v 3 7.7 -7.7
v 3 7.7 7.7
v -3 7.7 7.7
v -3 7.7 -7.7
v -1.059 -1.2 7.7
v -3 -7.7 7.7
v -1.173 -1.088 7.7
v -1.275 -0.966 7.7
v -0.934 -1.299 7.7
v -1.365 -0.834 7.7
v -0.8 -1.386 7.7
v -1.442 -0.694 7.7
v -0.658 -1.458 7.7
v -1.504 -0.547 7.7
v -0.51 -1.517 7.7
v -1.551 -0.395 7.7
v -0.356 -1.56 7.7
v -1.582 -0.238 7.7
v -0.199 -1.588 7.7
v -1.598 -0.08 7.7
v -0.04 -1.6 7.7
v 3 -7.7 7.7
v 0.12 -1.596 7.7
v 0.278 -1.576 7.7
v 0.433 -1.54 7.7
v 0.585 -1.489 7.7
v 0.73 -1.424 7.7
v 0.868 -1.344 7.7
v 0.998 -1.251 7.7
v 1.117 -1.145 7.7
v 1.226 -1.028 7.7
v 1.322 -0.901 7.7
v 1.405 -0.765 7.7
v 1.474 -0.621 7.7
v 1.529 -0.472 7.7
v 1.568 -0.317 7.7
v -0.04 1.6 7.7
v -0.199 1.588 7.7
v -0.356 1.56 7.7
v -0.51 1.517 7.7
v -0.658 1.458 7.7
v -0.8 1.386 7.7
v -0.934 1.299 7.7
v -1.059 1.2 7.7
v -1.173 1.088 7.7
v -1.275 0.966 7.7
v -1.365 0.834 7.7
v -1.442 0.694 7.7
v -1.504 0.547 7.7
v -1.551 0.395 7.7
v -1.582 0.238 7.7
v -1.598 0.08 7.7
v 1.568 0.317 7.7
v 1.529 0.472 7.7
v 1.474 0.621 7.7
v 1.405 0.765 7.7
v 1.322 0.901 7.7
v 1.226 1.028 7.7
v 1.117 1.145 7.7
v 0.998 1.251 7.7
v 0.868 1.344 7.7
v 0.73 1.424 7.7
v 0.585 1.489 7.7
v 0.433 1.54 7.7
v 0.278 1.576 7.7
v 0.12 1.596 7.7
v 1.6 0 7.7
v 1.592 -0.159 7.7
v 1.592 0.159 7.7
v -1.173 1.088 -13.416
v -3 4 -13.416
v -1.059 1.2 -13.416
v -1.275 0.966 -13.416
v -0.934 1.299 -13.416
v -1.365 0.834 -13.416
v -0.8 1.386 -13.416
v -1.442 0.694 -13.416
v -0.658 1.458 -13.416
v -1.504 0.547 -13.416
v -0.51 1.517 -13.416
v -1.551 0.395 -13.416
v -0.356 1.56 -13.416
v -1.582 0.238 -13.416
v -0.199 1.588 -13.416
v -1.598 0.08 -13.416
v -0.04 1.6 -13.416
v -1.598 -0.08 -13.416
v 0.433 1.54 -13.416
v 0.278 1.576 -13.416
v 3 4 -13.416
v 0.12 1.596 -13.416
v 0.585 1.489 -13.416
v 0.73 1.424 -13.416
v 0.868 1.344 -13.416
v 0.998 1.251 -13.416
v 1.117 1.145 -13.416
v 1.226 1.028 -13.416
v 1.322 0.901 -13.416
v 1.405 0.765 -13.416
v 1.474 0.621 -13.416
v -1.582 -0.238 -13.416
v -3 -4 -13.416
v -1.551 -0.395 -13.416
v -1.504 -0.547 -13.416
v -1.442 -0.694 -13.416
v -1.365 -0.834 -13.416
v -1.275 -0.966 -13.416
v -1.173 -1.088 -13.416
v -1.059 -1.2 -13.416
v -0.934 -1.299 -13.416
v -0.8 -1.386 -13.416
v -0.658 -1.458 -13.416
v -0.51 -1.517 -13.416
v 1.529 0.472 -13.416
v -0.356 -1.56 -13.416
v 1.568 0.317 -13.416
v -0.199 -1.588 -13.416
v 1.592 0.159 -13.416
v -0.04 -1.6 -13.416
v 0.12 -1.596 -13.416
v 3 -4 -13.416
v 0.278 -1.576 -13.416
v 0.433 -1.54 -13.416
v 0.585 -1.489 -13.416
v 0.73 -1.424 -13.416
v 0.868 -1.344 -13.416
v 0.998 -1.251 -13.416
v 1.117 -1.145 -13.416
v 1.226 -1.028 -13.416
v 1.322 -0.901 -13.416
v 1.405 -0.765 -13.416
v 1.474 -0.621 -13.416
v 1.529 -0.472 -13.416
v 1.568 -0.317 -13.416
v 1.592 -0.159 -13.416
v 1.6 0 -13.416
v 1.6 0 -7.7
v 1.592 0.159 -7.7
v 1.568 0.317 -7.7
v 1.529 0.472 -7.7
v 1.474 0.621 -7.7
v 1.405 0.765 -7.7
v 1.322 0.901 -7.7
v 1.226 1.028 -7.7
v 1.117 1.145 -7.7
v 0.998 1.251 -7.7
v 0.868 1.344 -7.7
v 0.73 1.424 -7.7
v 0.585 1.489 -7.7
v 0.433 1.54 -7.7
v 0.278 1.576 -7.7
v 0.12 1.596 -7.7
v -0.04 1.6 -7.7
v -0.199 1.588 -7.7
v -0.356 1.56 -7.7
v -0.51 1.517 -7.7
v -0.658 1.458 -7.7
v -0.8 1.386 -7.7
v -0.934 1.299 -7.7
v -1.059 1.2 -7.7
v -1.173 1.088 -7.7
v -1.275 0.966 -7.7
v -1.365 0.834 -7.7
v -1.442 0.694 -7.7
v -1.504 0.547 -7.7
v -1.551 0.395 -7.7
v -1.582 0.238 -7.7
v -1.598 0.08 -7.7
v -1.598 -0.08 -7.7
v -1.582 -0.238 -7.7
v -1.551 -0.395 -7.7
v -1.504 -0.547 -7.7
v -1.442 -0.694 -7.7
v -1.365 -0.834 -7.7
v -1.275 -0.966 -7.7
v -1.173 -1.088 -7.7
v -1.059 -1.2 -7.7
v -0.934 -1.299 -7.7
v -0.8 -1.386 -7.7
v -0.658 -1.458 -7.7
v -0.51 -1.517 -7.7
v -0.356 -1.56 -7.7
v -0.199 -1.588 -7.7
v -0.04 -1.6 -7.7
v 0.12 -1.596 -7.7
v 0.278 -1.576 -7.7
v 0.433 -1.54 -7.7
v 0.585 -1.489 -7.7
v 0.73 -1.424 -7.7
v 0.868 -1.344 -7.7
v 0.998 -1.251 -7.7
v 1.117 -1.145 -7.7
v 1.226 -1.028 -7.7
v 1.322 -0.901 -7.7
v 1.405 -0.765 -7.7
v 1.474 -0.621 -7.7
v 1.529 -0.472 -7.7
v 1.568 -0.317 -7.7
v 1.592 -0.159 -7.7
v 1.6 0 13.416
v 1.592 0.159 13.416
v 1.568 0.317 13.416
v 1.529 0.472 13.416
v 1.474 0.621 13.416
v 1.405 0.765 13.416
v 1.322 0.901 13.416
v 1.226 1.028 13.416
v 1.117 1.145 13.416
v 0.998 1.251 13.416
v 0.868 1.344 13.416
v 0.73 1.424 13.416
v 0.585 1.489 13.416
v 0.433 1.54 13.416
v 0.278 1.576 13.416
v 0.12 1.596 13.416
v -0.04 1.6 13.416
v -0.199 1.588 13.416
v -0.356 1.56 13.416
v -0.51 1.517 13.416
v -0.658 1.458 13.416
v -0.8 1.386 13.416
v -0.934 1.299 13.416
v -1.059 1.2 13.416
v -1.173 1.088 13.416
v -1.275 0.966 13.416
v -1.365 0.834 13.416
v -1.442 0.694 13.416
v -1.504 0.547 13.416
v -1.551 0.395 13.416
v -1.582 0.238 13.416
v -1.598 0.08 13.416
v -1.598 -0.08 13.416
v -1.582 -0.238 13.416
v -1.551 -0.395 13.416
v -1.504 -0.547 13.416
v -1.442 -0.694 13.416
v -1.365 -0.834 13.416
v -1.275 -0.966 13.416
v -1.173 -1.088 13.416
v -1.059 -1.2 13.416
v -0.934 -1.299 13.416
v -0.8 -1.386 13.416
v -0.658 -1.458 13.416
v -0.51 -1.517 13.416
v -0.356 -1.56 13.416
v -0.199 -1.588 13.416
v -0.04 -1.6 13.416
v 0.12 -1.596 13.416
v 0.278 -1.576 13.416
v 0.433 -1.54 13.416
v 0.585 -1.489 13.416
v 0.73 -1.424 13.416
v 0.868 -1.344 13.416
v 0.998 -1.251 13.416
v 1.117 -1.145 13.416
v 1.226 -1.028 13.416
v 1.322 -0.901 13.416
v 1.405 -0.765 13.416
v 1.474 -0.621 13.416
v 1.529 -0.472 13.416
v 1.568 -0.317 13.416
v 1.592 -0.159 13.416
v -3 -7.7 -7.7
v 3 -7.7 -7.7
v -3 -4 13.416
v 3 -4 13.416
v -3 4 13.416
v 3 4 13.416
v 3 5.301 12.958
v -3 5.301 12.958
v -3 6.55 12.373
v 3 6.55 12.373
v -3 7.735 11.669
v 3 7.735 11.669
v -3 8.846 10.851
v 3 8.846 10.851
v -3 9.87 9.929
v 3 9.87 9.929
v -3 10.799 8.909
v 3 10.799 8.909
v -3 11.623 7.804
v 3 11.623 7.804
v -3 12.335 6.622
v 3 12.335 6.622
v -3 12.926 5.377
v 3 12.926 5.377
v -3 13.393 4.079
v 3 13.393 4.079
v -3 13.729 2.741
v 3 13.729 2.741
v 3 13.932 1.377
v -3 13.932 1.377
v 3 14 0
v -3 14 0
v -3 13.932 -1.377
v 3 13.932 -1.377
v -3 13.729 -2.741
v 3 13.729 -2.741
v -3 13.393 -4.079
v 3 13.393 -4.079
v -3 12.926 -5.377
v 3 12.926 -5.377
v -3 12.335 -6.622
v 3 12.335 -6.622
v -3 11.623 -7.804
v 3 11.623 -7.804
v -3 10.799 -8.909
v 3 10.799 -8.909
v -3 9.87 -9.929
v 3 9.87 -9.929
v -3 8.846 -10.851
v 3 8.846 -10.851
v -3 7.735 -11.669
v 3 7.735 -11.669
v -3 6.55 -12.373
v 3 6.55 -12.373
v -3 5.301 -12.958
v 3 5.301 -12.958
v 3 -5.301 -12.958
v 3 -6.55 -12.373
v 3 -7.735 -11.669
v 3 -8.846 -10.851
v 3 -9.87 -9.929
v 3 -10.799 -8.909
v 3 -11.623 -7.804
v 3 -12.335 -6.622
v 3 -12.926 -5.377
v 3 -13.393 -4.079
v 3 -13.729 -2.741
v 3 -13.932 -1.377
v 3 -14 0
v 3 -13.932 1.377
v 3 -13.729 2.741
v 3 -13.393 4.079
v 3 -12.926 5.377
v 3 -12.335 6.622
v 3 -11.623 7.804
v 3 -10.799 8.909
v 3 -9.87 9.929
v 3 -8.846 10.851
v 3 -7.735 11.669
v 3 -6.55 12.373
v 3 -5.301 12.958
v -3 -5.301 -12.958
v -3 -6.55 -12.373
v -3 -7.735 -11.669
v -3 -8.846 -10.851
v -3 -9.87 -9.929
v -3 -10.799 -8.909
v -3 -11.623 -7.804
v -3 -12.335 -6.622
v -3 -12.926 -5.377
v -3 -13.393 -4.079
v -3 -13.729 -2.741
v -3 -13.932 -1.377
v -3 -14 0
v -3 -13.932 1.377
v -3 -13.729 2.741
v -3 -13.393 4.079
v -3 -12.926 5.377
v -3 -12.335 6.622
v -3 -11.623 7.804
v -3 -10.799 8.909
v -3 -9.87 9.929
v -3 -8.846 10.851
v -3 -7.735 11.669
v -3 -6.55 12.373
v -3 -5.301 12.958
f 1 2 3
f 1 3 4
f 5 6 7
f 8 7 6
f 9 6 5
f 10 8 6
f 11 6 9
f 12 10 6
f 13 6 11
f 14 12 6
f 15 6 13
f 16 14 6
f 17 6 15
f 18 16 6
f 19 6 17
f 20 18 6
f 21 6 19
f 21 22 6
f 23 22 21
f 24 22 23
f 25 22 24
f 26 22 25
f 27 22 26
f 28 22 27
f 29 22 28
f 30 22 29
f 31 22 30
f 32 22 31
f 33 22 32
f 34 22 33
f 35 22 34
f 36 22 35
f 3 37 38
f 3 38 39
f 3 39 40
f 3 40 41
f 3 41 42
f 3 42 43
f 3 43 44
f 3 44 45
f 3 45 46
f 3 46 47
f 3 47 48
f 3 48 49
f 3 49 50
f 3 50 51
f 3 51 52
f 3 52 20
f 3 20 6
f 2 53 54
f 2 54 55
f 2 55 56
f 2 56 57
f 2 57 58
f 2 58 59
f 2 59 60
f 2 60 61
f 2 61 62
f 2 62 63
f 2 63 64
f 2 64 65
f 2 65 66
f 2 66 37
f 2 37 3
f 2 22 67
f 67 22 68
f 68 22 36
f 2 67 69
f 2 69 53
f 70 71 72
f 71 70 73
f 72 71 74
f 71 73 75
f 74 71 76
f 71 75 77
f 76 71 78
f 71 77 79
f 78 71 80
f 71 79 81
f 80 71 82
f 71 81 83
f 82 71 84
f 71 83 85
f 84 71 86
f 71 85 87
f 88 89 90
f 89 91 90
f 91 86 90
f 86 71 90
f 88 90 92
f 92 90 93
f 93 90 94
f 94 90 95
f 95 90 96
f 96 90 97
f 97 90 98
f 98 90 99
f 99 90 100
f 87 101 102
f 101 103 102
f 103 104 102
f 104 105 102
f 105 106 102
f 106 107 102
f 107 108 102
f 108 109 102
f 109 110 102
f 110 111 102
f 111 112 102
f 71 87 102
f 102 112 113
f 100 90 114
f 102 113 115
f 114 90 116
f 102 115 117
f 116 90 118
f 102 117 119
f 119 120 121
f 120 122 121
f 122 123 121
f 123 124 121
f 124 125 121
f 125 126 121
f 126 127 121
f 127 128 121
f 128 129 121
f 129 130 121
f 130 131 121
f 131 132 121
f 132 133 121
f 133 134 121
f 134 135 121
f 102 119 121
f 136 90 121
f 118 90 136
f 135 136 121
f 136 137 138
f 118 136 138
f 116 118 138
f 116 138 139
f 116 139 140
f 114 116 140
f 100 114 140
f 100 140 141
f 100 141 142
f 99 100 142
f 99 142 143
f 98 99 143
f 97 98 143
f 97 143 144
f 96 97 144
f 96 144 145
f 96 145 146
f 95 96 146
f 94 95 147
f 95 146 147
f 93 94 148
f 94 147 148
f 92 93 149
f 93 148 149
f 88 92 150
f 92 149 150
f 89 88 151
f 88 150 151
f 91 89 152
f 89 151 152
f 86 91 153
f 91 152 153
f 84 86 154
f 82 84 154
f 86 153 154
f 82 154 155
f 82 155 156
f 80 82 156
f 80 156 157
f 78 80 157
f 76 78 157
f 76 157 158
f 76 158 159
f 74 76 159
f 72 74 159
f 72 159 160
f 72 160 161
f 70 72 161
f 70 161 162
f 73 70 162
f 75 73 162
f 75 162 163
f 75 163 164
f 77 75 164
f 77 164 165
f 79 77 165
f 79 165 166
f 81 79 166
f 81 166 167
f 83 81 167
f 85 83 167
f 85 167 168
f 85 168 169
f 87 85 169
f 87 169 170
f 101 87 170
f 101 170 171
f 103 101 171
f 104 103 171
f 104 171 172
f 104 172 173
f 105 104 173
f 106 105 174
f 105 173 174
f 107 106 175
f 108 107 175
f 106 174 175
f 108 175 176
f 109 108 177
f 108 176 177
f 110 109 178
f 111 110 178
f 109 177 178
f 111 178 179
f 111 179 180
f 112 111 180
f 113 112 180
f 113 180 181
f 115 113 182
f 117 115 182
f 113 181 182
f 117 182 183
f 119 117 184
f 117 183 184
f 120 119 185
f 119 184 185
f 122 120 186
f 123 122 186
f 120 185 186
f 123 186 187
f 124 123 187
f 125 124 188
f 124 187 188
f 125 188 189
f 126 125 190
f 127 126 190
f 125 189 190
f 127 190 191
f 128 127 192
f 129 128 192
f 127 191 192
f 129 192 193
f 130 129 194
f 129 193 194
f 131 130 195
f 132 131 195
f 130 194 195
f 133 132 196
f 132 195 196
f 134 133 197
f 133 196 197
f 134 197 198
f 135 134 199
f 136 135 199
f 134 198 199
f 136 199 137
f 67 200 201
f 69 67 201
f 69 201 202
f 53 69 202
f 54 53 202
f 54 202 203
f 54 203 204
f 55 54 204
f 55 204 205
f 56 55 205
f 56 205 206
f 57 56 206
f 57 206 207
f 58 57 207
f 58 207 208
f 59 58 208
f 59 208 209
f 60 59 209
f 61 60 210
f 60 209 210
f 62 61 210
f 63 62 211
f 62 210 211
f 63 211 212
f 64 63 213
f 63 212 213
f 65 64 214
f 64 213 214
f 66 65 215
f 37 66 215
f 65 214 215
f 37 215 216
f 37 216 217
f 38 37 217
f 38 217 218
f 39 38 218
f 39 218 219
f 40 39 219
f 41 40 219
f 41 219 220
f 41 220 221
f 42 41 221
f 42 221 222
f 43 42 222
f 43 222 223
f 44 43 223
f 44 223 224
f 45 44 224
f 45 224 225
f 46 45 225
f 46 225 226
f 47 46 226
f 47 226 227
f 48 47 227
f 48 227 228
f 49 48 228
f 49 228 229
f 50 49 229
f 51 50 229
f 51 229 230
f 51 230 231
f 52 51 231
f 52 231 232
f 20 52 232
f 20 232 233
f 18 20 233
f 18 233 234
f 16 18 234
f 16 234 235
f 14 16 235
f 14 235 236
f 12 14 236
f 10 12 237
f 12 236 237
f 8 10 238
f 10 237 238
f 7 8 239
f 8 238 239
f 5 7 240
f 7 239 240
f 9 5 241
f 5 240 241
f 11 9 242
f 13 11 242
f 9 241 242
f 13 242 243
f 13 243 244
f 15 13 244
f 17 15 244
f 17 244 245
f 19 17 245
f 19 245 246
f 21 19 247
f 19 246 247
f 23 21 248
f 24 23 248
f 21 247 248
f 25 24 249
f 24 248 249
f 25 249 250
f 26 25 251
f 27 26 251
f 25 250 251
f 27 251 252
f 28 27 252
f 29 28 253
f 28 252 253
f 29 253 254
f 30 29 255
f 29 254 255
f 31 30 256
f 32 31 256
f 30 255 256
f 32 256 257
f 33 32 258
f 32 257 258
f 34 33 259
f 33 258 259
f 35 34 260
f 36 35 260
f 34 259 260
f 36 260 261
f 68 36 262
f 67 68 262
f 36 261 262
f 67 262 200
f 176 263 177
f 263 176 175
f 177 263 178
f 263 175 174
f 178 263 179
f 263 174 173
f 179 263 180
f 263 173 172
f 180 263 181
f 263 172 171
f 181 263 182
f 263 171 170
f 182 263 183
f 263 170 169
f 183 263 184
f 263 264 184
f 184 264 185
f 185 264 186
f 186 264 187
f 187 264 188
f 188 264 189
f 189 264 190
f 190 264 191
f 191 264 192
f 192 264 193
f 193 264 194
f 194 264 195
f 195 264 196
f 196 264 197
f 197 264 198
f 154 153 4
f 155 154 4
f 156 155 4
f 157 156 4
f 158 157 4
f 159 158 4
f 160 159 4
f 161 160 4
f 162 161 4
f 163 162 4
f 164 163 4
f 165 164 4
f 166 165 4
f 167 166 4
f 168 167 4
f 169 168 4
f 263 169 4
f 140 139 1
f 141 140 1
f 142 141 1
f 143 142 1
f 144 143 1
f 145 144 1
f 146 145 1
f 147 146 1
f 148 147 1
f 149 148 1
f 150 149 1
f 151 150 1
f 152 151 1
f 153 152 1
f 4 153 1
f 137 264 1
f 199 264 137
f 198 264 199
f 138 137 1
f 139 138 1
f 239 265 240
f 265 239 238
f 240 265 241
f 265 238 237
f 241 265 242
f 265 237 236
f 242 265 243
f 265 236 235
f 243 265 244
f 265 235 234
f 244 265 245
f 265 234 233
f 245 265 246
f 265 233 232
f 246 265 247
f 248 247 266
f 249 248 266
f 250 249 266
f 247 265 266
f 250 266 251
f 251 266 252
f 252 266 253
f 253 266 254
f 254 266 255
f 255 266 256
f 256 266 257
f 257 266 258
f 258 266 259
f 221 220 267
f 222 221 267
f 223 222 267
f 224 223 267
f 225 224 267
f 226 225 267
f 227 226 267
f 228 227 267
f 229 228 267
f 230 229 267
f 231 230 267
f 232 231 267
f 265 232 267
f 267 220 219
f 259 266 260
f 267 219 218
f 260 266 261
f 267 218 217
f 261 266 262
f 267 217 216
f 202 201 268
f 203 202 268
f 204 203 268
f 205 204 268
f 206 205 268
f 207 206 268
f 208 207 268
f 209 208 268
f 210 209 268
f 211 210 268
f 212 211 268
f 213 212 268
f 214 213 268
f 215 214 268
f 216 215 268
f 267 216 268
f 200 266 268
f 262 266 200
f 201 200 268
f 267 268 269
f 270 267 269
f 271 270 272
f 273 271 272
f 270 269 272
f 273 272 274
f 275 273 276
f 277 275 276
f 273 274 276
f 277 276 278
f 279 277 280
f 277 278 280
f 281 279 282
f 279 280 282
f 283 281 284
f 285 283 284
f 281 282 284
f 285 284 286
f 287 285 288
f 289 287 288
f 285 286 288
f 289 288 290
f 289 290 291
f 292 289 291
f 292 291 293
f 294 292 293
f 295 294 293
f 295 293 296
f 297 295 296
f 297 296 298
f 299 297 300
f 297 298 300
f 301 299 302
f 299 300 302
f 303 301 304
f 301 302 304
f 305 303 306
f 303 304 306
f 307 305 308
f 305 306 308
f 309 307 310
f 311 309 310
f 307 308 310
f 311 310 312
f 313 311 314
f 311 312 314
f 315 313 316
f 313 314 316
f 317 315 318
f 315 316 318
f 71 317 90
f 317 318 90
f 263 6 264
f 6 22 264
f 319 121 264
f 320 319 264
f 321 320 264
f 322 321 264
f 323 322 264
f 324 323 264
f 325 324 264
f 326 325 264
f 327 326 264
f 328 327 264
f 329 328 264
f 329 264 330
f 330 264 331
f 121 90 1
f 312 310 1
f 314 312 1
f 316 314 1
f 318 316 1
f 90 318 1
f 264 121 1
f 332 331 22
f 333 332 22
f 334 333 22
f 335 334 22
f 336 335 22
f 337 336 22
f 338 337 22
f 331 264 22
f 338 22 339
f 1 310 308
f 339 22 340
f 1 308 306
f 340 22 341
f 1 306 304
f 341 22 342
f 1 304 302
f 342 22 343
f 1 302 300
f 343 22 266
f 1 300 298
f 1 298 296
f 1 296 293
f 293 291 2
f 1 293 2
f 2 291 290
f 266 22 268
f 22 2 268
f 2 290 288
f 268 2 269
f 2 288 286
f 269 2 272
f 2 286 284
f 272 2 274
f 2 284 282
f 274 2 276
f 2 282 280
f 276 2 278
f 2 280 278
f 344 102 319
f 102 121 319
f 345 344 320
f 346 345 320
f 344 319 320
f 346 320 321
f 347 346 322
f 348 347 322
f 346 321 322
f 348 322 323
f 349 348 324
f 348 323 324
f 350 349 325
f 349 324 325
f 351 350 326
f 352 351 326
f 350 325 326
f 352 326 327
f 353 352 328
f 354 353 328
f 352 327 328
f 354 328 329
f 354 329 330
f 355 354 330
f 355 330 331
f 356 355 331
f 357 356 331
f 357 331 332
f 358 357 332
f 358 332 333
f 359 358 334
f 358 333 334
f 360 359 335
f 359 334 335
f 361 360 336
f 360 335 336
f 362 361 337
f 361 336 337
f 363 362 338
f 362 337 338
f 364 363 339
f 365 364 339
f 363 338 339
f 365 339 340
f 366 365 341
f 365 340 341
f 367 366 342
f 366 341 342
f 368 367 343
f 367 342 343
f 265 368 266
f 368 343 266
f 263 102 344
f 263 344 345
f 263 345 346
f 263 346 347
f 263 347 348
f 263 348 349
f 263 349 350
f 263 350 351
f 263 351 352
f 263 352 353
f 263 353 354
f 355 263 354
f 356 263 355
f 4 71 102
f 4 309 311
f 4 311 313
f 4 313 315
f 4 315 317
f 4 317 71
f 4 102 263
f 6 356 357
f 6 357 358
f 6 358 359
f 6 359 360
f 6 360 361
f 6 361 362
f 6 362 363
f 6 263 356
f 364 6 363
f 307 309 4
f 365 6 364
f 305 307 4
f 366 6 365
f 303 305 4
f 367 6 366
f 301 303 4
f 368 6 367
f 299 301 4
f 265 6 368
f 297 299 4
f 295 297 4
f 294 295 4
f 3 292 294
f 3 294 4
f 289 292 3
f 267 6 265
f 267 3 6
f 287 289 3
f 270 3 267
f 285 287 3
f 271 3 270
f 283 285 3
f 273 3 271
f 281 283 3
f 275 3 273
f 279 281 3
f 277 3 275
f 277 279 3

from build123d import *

# Parameters (mm, degrees)
SKETCH_1_W          = 15.4
SKETCH_1_H          = 15.4
EXTRUDE_1_DEPTH     = 3
SKETCH_3_R          = 1.6
CUT_EXTRUDE_1_DEPTH = 31.413812651


with BuildPart() as part:
    # 草图1 → 凸台-拉伸1 (new, symmetric)
    with BuildSketch(Plane(origin=(0, 0, 0), x_dir=(0, 0, -1), z_dir=(1, 0, 0))):
        with BuildLine():
            Line((13.416407865, 4), (13.416407865, -4))
            ThreePointArc((13.416407865, -4), (0, -14), (-13.416407865, -4))
            Line((-13.416407865, -4), (-13.416407865, 4))
            ThreePointArc((-13.416407865, 4), (0, 14), (13.416407865, 4))
        make_face()
        Rectangle(SKETCH_1_W, SKETCH_1_H, mode=Mode.SUBTRACT)
    extrude(amount=EXTRUDE_1_DEPTH, both=True)

    # 草图3 → 切除-拉伸1 (cut, through all)
    with BuildSketch(Plane.XY.offset(13.416407865)):
        Circle(SKETCH_3_R)
    extrude(amount=-CUT_EXTRUDE_1_DEPTH, mode=Mode.SUBTRACT)


solid = part.part
